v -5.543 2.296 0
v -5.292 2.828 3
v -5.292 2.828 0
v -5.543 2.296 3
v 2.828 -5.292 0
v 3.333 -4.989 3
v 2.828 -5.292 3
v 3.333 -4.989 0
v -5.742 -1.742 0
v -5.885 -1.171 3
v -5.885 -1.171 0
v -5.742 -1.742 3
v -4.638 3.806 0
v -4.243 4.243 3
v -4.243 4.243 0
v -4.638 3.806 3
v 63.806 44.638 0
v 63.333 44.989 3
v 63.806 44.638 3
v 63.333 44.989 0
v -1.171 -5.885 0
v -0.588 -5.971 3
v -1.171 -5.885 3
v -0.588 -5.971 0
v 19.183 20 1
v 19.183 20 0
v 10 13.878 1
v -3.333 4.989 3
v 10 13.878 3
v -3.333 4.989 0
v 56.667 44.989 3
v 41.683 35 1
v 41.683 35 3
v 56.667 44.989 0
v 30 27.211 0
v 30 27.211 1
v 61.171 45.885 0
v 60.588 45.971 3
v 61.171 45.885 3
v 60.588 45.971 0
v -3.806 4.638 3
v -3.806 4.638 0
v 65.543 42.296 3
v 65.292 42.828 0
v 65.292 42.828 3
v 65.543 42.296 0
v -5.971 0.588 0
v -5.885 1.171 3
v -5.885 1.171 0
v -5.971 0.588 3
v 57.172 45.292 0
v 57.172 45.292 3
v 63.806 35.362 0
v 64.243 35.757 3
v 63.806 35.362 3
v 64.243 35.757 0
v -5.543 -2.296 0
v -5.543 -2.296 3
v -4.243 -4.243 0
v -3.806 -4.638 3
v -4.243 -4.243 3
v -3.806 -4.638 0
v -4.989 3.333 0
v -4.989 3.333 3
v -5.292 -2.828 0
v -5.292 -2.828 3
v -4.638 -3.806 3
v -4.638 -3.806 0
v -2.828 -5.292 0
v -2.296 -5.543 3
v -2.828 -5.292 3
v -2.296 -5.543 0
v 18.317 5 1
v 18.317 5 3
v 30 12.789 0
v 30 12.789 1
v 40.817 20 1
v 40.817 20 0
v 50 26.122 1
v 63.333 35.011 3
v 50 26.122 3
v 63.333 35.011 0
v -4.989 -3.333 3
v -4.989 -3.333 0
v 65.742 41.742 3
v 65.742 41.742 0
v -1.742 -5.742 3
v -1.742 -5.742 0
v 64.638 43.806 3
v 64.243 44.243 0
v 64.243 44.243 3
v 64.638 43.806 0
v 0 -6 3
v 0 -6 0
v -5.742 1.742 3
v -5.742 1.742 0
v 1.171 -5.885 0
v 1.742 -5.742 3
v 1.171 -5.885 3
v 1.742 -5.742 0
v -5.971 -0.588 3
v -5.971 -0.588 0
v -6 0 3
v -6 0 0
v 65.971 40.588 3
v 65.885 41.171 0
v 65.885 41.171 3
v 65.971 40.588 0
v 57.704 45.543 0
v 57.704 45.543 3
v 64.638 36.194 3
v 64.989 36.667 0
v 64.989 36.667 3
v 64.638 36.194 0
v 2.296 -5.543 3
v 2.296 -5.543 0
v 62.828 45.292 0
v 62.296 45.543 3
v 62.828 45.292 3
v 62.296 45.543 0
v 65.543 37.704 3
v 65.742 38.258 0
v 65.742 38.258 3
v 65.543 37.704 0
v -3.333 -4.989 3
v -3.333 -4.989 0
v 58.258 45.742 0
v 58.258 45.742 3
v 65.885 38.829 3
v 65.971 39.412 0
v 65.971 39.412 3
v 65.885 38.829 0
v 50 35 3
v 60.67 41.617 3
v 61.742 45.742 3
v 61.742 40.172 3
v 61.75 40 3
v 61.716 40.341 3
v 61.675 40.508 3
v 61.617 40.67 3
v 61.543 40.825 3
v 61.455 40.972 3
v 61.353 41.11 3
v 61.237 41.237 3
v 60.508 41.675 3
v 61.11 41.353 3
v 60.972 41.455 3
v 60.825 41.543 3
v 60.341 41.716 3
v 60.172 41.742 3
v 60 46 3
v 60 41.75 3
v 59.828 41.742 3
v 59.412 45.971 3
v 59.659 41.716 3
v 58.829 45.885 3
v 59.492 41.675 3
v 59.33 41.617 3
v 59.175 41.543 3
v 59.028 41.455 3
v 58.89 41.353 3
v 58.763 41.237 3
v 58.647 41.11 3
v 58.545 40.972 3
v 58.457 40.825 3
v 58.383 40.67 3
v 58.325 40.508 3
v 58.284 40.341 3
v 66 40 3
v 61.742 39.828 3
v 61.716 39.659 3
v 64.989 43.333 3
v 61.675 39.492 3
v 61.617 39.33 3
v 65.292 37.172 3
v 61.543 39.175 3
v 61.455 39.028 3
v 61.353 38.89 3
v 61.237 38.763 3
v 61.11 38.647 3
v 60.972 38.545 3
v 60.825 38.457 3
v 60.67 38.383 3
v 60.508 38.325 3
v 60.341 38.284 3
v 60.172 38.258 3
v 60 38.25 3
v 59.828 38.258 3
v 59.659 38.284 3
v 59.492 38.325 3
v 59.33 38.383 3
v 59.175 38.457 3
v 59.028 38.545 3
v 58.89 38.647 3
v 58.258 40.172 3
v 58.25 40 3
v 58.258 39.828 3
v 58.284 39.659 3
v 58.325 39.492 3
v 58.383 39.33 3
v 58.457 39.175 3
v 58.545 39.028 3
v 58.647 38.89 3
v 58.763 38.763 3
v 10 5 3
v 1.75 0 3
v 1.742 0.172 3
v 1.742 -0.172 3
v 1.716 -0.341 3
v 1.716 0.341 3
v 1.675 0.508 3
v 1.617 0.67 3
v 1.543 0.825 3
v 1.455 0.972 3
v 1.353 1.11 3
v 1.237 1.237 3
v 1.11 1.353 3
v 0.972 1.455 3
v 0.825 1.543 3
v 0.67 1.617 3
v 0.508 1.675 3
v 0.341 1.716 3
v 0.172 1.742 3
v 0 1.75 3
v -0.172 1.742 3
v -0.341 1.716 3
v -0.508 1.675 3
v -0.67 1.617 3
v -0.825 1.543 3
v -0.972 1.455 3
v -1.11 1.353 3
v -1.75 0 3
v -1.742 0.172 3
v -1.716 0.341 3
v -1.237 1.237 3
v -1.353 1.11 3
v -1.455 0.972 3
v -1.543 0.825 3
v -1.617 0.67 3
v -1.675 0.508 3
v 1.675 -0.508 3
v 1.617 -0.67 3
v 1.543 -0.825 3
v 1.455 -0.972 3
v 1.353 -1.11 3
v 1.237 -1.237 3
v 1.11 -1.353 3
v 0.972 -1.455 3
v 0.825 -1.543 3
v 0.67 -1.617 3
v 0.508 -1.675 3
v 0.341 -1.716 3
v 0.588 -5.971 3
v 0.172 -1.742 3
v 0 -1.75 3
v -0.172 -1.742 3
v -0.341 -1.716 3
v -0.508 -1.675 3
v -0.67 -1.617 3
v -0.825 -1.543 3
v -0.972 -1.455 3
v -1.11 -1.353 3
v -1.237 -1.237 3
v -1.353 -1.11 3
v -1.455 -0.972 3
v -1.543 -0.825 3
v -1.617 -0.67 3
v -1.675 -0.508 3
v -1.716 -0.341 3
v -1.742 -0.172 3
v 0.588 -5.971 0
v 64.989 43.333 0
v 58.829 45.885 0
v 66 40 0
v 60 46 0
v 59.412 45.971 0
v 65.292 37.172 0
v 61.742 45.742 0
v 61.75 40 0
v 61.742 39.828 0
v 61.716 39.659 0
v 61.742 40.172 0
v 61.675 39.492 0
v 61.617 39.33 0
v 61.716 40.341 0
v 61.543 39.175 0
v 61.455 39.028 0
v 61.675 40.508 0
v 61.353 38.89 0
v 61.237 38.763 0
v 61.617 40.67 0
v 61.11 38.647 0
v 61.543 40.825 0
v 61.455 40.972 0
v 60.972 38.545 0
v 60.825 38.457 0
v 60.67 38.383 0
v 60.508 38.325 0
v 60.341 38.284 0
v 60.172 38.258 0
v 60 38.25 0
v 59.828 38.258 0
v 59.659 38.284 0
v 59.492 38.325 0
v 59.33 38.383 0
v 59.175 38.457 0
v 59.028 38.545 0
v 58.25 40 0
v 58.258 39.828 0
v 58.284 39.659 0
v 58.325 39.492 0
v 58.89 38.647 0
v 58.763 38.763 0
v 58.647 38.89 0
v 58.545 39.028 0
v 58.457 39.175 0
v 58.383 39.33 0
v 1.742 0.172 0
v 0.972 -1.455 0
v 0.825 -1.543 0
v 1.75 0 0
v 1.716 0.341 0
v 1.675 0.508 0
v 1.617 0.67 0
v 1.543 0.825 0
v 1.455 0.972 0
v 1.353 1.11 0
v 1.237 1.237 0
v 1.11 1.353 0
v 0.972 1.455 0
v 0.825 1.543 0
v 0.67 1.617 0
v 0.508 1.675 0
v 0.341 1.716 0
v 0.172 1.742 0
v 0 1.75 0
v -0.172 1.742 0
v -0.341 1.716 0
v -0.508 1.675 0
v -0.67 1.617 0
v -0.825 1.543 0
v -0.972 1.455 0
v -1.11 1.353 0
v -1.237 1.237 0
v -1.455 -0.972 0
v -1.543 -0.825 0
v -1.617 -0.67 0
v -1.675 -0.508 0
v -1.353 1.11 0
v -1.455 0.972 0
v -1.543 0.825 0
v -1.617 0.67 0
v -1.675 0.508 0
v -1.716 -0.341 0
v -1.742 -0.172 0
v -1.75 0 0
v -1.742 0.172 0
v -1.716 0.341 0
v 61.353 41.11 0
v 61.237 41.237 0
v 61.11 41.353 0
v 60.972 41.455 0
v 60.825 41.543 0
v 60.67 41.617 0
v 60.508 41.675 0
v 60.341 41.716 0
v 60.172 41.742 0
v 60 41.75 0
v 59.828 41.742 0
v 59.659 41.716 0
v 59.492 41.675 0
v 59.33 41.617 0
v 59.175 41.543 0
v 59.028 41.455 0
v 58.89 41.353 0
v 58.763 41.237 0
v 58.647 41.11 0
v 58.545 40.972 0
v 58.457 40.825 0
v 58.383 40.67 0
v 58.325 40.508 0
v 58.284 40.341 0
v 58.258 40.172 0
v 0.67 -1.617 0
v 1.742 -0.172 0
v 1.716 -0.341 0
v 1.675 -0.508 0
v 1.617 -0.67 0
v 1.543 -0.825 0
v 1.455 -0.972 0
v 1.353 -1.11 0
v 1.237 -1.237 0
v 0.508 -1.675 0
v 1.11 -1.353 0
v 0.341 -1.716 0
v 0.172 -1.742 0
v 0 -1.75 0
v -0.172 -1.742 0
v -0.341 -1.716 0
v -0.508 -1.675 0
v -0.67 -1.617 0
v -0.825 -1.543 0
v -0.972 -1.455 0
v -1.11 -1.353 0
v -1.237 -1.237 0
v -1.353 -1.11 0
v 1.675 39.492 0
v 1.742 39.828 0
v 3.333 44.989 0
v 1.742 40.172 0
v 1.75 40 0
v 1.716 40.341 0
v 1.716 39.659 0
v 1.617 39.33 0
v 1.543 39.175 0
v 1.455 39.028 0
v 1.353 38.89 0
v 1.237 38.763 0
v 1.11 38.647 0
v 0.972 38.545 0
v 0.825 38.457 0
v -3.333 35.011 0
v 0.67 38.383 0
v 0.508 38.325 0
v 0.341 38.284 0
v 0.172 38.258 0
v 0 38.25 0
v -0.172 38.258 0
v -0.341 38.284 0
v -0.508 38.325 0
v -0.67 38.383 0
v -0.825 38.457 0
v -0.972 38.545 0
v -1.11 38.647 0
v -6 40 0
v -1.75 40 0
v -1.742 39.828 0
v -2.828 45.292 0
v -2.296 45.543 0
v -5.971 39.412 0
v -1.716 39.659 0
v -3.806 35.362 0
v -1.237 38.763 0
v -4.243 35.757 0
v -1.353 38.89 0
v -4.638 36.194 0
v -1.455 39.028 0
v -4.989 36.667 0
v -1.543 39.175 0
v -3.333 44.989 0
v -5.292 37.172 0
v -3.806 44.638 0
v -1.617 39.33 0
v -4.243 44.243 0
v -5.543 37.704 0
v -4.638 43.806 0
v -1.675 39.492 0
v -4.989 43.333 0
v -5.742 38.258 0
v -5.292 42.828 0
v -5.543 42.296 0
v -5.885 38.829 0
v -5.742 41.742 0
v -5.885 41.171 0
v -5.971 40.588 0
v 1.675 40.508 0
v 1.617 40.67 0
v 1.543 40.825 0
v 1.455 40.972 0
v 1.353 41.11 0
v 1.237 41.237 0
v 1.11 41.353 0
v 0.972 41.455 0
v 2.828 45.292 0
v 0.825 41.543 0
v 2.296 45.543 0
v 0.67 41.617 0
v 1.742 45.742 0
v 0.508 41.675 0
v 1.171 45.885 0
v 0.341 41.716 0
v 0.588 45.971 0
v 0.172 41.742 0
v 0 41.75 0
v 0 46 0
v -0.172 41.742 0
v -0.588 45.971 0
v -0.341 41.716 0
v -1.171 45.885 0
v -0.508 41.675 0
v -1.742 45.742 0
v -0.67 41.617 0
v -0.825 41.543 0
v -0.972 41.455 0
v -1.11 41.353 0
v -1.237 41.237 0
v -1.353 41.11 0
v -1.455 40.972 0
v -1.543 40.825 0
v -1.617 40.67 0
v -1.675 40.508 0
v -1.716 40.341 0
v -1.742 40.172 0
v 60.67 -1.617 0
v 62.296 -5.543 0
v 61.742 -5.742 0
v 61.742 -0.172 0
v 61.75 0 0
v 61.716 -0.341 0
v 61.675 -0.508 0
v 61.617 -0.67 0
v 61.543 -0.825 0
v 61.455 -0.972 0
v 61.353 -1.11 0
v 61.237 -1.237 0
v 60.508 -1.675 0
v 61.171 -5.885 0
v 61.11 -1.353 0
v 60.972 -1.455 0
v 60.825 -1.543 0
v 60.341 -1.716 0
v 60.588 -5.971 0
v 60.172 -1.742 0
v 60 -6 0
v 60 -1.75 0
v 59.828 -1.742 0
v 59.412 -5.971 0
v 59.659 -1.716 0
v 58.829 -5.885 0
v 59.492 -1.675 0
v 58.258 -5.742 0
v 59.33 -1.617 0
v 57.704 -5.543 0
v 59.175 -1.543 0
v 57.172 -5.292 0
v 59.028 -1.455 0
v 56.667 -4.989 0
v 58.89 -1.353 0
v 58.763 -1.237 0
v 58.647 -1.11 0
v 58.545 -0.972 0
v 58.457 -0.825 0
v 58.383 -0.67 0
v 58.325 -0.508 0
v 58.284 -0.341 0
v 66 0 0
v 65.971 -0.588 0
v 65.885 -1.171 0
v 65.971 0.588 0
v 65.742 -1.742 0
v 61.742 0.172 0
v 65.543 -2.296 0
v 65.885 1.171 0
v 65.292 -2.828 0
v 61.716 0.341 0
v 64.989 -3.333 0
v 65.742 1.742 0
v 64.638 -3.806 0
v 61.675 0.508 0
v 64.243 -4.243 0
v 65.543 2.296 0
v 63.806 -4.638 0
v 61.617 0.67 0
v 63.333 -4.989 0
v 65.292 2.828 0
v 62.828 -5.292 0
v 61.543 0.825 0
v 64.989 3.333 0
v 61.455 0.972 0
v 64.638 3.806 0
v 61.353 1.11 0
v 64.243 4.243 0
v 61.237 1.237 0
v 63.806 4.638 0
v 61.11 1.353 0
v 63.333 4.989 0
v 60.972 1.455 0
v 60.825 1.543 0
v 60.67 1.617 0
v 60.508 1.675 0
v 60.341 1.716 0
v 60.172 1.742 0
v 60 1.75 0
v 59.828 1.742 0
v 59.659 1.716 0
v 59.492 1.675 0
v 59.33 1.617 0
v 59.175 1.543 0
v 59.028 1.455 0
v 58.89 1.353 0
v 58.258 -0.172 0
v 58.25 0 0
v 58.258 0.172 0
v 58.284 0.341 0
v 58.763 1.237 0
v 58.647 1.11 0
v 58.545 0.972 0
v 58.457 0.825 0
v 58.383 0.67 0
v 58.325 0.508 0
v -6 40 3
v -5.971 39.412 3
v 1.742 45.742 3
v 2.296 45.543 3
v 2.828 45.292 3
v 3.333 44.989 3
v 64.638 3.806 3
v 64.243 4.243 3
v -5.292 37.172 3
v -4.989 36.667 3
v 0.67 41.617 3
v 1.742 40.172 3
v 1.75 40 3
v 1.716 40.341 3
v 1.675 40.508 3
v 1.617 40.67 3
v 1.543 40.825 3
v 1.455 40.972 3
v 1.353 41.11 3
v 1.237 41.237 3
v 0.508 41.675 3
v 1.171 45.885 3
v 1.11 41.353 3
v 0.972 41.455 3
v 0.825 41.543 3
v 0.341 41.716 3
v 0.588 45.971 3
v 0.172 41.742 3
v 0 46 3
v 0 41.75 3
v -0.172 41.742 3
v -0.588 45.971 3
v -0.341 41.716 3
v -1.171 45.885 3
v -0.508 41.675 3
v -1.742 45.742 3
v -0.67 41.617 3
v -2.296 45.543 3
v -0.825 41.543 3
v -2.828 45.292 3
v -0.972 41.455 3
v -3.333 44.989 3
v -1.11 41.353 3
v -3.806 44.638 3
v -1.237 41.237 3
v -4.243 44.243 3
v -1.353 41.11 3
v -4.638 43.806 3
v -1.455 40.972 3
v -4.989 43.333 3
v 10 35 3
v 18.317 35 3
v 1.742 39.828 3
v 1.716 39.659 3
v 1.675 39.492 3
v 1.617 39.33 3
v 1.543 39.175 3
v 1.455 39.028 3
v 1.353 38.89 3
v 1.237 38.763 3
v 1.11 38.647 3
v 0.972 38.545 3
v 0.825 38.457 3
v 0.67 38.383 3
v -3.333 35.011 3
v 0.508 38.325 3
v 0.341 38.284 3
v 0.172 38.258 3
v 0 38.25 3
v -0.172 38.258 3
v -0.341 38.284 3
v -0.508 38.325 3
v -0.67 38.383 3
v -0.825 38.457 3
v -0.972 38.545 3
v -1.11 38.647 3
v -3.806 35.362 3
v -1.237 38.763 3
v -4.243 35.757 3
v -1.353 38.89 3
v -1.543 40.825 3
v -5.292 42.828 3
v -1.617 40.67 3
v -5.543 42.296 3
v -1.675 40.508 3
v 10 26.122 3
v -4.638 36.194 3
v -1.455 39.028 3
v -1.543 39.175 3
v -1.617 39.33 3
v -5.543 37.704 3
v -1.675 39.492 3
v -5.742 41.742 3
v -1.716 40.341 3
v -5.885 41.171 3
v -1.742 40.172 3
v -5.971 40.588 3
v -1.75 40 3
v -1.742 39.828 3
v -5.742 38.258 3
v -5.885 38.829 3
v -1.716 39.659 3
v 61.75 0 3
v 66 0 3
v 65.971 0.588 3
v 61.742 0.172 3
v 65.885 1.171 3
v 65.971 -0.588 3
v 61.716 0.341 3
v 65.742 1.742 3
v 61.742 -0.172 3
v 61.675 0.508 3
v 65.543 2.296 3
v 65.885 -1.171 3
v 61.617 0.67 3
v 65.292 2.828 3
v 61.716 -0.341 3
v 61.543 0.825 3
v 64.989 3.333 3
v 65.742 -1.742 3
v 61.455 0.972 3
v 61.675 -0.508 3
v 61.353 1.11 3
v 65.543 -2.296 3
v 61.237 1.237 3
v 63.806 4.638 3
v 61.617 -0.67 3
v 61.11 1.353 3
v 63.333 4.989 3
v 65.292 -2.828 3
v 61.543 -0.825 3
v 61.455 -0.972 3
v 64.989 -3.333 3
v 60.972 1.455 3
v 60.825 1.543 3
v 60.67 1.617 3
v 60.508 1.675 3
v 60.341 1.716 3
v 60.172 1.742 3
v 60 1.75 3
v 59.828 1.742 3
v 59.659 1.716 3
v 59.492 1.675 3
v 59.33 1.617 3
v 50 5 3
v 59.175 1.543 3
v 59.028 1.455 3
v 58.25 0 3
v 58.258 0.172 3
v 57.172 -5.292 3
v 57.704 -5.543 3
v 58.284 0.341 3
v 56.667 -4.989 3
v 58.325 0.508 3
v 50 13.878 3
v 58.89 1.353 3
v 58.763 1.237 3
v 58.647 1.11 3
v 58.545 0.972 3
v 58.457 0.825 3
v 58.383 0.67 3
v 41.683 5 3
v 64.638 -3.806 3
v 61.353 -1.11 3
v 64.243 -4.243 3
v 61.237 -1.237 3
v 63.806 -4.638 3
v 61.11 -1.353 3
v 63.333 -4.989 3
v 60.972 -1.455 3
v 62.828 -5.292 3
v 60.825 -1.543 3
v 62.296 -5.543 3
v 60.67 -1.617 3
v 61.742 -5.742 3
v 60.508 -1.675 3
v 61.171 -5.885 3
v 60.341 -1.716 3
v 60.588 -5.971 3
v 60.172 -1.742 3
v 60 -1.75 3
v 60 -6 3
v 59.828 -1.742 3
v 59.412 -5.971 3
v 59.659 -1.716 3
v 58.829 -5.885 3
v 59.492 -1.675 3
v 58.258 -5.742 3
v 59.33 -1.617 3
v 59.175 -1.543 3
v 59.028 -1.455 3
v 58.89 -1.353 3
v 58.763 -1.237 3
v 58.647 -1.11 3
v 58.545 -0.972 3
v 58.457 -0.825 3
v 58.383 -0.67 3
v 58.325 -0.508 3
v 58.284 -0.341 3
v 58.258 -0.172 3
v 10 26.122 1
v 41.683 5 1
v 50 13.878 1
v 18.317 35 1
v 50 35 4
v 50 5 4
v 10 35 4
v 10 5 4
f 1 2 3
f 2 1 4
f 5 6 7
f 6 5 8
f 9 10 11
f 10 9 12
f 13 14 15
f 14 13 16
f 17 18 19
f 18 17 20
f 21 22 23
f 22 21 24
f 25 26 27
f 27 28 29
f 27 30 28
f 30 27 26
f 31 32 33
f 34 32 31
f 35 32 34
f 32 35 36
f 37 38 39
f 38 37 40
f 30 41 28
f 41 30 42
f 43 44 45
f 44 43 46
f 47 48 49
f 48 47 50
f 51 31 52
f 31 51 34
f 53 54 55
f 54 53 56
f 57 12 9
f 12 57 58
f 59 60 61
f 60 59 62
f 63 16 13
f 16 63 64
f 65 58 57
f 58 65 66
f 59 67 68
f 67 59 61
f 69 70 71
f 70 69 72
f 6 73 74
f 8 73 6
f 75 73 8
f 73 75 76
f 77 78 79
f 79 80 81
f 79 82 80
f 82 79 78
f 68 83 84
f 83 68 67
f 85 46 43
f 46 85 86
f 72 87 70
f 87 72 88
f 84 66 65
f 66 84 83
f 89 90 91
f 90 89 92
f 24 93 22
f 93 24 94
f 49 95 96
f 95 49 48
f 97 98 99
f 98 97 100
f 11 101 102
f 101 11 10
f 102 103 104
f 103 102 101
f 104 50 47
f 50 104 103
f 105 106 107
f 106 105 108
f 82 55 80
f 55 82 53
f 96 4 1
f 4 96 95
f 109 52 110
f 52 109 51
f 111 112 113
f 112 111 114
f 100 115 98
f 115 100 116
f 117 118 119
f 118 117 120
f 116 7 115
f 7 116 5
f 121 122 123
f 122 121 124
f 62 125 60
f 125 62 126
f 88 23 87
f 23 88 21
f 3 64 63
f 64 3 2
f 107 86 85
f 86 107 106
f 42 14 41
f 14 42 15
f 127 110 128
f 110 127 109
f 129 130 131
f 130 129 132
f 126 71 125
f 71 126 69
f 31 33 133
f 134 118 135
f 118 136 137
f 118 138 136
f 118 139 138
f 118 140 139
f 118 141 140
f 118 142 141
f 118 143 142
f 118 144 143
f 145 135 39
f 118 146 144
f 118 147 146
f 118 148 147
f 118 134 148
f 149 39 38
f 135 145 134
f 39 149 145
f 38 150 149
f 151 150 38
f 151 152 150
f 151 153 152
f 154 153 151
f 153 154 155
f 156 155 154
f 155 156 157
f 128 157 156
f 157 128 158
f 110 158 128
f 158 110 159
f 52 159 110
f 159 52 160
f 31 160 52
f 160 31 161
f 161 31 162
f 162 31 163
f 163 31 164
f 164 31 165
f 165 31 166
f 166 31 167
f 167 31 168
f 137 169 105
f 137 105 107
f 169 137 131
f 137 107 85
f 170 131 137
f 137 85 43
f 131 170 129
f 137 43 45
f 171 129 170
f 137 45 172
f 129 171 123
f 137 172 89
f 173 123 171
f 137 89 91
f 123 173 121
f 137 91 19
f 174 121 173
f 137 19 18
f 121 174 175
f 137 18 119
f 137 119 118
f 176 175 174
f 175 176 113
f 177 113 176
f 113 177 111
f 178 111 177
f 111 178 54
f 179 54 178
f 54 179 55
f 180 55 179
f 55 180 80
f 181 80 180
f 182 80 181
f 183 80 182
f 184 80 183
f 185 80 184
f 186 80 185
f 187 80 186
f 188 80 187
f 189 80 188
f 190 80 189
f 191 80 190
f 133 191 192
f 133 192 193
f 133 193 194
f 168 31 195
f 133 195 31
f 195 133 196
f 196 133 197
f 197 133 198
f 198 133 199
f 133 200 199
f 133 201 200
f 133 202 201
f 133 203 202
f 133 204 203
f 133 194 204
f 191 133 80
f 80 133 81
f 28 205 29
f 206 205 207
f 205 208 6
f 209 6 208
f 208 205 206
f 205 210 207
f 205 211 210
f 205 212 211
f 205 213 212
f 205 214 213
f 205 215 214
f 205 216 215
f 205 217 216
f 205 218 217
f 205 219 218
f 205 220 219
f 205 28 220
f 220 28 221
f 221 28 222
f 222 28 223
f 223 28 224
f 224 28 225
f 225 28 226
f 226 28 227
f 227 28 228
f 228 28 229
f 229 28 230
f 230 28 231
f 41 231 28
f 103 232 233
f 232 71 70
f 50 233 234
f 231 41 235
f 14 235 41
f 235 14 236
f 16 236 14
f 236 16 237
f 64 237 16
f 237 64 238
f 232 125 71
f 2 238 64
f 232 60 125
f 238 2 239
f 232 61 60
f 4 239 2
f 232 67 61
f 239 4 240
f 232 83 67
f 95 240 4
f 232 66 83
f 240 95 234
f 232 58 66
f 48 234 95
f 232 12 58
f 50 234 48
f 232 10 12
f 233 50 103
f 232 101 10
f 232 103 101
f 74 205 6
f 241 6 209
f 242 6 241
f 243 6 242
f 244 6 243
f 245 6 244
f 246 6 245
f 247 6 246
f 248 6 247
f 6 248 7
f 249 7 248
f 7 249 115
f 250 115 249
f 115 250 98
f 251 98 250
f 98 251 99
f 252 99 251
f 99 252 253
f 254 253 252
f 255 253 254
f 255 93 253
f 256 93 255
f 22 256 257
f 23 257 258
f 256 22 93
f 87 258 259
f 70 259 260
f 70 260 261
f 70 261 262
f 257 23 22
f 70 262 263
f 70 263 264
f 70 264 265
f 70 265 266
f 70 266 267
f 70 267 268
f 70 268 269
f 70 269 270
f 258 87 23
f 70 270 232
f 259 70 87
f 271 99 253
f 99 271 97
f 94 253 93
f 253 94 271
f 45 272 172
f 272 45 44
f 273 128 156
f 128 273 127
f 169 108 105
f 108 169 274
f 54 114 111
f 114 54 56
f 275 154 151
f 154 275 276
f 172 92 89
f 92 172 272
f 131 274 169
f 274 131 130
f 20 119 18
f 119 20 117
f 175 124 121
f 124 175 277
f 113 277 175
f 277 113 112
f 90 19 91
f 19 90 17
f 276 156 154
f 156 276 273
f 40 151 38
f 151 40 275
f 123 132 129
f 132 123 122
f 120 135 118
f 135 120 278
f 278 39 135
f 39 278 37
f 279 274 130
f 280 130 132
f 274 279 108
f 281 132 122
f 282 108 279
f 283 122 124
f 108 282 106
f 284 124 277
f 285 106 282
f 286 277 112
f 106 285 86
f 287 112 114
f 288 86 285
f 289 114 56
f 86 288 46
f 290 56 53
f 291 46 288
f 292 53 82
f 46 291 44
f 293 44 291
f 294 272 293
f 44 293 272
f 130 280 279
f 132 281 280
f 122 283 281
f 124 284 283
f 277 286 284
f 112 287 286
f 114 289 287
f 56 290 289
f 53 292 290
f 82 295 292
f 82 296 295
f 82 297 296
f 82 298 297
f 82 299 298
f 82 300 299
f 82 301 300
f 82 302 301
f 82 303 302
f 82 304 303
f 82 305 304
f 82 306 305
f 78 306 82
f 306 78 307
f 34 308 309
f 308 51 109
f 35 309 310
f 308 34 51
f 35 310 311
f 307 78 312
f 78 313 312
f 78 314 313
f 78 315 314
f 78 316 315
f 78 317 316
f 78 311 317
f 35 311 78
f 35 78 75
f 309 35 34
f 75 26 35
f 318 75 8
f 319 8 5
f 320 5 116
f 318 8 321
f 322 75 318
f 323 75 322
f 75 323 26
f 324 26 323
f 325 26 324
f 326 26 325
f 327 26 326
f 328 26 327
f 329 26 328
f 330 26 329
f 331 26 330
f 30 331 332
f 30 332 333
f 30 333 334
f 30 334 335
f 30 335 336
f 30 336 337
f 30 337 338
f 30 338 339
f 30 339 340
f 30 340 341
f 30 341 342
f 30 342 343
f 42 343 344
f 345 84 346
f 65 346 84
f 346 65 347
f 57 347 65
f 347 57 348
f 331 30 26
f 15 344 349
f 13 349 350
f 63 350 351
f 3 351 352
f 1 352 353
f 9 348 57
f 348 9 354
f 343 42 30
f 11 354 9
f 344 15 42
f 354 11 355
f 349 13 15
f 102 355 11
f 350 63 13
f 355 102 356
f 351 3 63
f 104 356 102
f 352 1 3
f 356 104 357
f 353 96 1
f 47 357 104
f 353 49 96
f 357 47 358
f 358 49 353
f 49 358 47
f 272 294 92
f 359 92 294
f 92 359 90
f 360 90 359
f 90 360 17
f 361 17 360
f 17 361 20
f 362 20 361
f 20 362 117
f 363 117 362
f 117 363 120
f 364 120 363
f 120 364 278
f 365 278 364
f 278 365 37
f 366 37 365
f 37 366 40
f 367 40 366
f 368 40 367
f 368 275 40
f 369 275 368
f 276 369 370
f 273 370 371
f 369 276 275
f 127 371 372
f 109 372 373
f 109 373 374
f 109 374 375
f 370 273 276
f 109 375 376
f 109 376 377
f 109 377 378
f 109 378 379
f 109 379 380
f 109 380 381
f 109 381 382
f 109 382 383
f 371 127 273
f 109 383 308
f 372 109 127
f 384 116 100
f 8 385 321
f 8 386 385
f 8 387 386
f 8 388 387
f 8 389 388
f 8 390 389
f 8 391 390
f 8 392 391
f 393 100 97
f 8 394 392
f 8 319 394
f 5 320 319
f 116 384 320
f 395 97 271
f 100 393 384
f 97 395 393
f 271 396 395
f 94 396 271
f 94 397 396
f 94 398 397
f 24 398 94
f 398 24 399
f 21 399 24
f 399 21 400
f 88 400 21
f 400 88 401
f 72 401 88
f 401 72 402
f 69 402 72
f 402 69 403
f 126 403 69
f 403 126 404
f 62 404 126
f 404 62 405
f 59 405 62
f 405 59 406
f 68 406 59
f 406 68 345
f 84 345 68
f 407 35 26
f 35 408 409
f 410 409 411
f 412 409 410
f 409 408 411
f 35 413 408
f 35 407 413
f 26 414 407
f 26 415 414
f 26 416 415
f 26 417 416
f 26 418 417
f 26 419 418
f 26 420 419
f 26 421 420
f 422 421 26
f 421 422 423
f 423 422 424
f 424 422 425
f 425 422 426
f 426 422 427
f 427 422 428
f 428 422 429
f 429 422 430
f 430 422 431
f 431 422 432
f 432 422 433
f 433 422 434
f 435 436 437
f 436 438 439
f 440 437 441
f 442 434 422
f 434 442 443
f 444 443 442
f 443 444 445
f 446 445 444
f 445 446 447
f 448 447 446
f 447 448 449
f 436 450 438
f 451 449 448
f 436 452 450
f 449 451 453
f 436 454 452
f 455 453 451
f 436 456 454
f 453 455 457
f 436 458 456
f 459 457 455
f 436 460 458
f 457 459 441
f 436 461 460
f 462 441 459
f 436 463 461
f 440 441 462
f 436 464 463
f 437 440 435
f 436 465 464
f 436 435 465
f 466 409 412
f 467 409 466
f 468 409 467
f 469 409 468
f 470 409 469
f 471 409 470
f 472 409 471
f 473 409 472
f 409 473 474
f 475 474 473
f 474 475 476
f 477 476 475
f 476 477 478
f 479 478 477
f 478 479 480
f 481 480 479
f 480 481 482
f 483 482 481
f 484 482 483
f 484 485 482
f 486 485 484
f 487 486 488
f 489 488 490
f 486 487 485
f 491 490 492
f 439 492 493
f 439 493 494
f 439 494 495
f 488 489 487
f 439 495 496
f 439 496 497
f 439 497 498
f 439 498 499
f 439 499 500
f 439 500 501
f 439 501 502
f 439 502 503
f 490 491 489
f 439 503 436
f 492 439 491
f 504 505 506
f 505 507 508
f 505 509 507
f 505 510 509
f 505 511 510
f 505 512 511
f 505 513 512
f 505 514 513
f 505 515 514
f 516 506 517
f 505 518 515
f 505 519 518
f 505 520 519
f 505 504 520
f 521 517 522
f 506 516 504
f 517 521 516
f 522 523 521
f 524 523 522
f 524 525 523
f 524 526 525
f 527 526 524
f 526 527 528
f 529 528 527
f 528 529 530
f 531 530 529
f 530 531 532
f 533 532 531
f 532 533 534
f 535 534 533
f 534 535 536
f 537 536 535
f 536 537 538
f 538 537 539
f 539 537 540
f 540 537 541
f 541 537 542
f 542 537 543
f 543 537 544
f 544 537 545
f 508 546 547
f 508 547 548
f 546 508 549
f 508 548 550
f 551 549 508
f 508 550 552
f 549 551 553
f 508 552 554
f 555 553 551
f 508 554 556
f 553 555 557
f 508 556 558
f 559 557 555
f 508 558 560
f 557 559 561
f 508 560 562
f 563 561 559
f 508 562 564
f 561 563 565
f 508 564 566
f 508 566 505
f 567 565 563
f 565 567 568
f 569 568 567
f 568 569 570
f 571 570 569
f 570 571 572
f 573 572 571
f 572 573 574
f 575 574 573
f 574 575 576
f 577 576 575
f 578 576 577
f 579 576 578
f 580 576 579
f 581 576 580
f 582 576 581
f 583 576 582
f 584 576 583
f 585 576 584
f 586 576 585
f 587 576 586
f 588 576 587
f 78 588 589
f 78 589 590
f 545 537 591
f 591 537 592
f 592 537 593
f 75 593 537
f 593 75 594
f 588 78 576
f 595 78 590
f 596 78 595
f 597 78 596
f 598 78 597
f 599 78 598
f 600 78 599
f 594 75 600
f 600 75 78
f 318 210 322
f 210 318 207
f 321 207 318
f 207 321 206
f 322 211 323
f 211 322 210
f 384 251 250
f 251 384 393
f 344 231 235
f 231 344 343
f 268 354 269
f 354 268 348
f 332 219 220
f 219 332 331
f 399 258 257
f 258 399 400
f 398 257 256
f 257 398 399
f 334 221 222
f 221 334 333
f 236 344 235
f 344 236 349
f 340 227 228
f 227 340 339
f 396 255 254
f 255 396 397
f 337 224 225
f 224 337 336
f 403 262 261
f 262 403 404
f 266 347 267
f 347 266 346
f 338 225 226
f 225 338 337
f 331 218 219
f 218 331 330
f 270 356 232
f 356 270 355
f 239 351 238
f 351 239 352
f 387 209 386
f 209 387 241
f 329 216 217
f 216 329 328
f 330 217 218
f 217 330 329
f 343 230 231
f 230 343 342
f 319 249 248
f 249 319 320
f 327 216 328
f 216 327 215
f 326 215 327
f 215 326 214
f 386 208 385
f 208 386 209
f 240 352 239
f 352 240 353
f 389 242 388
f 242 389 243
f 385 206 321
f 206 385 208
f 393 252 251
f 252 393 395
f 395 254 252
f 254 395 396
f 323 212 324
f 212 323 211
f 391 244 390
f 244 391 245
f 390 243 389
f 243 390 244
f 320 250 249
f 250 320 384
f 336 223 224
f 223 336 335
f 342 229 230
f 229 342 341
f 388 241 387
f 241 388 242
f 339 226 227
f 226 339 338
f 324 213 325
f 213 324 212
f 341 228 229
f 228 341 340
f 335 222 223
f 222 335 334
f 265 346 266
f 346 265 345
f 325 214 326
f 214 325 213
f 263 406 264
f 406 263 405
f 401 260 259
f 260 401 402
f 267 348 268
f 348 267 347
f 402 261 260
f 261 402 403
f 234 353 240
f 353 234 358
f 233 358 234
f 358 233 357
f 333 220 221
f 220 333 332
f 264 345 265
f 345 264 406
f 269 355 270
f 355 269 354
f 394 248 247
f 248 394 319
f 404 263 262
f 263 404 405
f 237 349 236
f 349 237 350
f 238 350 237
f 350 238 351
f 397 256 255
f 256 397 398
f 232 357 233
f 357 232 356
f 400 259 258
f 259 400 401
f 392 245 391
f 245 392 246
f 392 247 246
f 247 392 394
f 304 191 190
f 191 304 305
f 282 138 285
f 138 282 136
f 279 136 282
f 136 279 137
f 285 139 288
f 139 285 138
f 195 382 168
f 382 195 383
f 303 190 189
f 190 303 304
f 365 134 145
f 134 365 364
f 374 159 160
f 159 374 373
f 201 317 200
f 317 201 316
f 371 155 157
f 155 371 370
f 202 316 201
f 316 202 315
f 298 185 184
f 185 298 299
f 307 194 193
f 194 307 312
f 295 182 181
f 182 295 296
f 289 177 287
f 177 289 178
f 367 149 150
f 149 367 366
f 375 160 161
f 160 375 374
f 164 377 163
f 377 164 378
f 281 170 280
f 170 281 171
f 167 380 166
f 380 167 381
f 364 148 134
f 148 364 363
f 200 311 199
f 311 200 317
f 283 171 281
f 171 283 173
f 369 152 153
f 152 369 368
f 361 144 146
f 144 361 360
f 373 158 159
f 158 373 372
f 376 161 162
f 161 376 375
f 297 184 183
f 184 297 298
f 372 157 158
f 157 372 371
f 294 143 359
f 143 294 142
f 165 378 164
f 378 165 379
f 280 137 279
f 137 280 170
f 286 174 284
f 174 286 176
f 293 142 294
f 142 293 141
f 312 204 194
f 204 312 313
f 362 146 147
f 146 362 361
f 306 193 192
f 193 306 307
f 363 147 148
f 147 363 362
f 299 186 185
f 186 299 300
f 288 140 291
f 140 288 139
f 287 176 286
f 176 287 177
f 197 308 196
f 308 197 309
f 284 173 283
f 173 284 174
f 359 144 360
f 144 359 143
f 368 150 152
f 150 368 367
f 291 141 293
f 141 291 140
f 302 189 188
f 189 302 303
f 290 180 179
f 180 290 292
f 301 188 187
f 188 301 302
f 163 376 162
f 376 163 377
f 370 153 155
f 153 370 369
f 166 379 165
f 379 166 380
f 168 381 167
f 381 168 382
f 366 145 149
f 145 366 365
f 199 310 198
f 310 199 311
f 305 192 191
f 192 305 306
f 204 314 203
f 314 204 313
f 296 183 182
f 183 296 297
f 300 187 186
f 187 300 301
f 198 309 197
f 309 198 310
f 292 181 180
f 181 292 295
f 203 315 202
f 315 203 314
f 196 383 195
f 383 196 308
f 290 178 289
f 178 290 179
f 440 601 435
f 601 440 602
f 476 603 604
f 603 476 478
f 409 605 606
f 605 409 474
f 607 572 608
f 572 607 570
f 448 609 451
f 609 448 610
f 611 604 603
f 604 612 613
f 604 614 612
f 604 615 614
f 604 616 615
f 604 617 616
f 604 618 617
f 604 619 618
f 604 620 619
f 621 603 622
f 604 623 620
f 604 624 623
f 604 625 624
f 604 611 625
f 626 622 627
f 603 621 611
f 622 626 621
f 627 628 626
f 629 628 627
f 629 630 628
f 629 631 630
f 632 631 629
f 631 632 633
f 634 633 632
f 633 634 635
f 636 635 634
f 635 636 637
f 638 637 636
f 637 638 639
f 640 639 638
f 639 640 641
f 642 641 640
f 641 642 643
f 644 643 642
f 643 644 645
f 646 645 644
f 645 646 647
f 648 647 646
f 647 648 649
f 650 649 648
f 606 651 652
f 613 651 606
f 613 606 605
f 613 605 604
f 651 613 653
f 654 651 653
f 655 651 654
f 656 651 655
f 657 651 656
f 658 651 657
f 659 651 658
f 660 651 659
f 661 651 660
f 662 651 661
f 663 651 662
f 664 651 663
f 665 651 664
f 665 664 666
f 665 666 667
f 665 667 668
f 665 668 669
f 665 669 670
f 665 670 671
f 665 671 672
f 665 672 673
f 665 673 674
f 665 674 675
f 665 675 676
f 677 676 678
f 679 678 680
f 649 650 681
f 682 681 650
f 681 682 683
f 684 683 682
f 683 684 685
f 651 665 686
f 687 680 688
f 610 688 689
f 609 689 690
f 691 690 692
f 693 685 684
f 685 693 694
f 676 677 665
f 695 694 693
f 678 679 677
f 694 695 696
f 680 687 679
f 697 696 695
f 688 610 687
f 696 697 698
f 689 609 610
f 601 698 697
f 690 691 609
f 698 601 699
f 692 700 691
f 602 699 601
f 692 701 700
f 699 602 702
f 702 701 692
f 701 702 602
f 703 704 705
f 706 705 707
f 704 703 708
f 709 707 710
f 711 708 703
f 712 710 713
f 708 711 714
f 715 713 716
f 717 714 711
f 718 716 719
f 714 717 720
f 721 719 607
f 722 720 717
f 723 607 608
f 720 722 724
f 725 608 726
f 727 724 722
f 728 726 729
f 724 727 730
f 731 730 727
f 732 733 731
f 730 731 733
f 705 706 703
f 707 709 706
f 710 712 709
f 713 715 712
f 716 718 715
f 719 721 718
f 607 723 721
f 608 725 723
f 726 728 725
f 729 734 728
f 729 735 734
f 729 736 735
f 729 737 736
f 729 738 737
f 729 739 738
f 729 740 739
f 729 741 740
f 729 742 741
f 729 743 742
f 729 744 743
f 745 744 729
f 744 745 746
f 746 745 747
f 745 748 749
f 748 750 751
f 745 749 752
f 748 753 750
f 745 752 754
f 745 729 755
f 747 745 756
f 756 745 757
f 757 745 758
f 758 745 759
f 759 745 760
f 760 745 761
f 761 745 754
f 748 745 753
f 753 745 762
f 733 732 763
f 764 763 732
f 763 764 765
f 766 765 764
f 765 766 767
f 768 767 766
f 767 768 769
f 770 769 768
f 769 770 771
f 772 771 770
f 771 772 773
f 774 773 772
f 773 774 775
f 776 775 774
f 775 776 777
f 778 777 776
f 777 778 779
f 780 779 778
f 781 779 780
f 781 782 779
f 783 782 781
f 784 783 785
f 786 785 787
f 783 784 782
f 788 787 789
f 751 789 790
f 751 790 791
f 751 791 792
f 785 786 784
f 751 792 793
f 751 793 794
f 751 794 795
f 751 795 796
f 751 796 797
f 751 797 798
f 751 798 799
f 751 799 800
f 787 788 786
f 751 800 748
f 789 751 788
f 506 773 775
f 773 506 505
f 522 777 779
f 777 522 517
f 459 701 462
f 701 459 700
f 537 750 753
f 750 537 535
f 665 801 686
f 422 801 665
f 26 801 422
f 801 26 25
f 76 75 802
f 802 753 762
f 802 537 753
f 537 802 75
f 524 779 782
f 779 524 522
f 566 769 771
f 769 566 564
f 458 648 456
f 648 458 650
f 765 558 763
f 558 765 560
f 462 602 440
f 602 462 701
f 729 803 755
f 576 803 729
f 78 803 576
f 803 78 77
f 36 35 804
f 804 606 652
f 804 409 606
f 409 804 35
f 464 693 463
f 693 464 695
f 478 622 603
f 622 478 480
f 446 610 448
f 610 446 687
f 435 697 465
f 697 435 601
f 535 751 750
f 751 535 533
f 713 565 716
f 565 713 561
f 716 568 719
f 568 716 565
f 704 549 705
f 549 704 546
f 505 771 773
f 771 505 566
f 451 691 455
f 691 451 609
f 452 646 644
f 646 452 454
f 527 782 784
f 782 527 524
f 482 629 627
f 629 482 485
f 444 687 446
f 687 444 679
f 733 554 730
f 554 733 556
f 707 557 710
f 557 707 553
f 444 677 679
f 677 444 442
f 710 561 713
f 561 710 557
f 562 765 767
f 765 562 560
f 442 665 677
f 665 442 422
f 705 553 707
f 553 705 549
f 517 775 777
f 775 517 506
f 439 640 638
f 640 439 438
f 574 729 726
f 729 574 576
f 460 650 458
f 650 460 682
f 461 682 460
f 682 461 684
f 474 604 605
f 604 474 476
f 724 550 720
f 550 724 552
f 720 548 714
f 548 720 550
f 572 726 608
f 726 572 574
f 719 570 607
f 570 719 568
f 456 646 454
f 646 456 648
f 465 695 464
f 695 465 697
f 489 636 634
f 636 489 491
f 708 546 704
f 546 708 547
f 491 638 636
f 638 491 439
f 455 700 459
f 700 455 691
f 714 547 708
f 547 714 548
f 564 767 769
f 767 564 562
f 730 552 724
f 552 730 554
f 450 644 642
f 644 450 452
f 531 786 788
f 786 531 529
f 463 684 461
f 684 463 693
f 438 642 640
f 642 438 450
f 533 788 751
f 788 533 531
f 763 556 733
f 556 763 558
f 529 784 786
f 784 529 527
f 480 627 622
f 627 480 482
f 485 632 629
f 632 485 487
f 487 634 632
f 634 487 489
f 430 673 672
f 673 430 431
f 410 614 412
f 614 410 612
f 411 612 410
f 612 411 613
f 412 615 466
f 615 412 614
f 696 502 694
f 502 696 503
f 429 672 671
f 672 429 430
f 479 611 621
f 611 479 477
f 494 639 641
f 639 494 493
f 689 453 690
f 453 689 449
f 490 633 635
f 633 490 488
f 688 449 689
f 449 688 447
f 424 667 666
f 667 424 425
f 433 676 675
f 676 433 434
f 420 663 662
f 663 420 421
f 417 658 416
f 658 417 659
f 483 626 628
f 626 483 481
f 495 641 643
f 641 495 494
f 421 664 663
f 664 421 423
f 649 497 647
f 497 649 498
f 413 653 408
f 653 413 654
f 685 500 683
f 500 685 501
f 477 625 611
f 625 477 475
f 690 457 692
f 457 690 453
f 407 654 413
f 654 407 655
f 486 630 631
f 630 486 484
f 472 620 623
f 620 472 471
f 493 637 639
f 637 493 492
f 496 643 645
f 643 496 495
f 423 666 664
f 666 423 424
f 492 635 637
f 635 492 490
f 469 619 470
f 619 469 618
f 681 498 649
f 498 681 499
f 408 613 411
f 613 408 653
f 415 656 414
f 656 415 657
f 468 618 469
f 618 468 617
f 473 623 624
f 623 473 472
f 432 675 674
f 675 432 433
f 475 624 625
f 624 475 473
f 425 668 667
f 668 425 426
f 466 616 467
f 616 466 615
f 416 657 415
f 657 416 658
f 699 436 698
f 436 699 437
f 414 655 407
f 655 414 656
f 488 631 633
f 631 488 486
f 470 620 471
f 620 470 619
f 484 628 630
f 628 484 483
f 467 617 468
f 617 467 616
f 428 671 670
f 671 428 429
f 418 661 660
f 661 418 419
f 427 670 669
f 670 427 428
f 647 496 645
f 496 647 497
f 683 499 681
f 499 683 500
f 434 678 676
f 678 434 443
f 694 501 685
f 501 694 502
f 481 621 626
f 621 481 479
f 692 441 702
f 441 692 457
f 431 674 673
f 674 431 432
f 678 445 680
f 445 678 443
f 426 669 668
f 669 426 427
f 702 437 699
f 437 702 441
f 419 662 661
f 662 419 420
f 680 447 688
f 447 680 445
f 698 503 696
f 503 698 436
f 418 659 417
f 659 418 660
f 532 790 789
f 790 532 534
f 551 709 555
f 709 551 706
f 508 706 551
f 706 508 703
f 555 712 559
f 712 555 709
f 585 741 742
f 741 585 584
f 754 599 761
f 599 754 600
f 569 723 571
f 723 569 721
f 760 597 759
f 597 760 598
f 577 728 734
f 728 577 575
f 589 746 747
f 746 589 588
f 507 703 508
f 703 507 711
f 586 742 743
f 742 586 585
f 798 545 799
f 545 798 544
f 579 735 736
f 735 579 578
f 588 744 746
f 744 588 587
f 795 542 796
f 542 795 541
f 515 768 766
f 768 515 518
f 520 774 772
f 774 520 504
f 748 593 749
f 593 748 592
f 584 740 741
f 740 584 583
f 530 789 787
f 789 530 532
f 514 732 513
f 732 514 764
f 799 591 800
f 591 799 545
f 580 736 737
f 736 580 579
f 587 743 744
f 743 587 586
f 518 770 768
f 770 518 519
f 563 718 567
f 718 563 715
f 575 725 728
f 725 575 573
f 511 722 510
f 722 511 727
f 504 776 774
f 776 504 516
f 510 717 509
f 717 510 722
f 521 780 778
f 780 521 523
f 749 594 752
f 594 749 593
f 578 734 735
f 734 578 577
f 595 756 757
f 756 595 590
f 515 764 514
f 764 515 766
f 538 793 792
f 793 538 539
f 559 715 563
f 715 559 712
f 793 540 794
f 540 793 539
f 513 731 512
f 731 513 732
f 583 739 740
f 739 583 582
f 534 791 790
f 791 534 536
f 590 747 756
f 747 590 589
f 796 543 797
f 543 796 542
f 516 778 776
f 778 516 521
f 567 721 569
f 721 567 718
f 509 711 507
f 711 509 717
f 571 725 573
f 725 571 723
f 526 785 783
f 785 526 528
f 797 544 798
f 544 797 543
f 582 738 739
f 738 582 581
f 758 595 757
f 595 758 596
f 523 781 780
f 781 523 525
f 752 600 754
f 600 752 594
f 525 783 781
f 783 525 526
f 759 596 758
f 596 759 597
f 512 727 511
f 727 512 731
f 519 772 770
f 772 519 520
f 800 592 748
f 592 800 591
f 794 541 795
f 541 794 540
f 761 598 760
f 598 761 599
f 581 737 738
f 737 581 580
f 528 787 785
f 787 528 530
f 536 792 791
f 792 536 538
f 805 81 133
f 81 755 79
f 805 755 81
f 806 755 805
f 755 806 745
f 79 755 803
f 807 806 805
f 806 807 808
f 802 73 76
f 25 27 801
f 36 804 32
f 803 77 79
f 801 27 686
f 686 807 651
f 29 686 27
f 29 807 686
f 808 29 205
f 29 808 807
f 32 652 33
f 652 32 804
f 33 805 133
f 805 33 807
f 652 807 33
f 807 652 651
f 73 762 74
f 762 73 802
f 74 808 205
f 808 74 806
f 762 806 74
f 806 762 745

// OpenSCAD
bodyPieceD();

module bodyPieceD() {

    fixations_position_lenth = 60;
    fixations_position_width = 40;

    branches_width = 12;

    platform_lenth = 40;
    platform_width = 30;
    platform_z_offset = 1;

    _fn = 64;
    thickness = 3;

    // Fixations holes configuration
    screw_hole_diameter = 3.5;

    union() {
        difference() {        
            hull() {
                translate([0, 0, 0])
                    cylinder(h = thickness, r = branches_width / 2, center = false, $fn = _fn);
                translate([fixations_position_lenth, fixations_position_width, 0])
                    cylinder(h = thickness, r = branches_width / 2, center = false, $fn = _fn);
            }
            translate([0, 0, 0])
                cylinder(h = thickness * 5, r = screw_hole_diameter / 2, center = true, $fn = _fn);

            translate([fixations_position_lenth, fixations_position_width, 0])
                cylinder(h = thickness * 5, r = screw_hole_diameter / 2, center = true, $fn = _fn);
        }

        difference() {        
            hull() {
                translate([0, fixations_position_width, 0])
                    cylinder(h = thickness, r = branches_width / 2, center = false, $fn = _fn);
                translate([fixations_position_lenth, 0, 0])
                    cylinder(h = thickness, r = branches_width / 2, center = false, $fn = _fn);
            }
            translate([0, fixations_position_width, 0])
                cylinder(h = thickness * 5, r = screw_hole_diameter / 2, center = true, $fn = _fn);

            translate([fixations_position_lenth, 0, 0])
                cylinder(h = thickness * 5, r = screw_hole_diameter / 2, center = true, $fn = _fn);
        }

        // Platfor for components
        translate([
            fixations_position_lenth / 2,
            fixations_position_width / 2,
            thickness / 2 + platform_z_offset
            ])
            cube([platform_lenth, platform_width, thickness], center = true);

    }

}
